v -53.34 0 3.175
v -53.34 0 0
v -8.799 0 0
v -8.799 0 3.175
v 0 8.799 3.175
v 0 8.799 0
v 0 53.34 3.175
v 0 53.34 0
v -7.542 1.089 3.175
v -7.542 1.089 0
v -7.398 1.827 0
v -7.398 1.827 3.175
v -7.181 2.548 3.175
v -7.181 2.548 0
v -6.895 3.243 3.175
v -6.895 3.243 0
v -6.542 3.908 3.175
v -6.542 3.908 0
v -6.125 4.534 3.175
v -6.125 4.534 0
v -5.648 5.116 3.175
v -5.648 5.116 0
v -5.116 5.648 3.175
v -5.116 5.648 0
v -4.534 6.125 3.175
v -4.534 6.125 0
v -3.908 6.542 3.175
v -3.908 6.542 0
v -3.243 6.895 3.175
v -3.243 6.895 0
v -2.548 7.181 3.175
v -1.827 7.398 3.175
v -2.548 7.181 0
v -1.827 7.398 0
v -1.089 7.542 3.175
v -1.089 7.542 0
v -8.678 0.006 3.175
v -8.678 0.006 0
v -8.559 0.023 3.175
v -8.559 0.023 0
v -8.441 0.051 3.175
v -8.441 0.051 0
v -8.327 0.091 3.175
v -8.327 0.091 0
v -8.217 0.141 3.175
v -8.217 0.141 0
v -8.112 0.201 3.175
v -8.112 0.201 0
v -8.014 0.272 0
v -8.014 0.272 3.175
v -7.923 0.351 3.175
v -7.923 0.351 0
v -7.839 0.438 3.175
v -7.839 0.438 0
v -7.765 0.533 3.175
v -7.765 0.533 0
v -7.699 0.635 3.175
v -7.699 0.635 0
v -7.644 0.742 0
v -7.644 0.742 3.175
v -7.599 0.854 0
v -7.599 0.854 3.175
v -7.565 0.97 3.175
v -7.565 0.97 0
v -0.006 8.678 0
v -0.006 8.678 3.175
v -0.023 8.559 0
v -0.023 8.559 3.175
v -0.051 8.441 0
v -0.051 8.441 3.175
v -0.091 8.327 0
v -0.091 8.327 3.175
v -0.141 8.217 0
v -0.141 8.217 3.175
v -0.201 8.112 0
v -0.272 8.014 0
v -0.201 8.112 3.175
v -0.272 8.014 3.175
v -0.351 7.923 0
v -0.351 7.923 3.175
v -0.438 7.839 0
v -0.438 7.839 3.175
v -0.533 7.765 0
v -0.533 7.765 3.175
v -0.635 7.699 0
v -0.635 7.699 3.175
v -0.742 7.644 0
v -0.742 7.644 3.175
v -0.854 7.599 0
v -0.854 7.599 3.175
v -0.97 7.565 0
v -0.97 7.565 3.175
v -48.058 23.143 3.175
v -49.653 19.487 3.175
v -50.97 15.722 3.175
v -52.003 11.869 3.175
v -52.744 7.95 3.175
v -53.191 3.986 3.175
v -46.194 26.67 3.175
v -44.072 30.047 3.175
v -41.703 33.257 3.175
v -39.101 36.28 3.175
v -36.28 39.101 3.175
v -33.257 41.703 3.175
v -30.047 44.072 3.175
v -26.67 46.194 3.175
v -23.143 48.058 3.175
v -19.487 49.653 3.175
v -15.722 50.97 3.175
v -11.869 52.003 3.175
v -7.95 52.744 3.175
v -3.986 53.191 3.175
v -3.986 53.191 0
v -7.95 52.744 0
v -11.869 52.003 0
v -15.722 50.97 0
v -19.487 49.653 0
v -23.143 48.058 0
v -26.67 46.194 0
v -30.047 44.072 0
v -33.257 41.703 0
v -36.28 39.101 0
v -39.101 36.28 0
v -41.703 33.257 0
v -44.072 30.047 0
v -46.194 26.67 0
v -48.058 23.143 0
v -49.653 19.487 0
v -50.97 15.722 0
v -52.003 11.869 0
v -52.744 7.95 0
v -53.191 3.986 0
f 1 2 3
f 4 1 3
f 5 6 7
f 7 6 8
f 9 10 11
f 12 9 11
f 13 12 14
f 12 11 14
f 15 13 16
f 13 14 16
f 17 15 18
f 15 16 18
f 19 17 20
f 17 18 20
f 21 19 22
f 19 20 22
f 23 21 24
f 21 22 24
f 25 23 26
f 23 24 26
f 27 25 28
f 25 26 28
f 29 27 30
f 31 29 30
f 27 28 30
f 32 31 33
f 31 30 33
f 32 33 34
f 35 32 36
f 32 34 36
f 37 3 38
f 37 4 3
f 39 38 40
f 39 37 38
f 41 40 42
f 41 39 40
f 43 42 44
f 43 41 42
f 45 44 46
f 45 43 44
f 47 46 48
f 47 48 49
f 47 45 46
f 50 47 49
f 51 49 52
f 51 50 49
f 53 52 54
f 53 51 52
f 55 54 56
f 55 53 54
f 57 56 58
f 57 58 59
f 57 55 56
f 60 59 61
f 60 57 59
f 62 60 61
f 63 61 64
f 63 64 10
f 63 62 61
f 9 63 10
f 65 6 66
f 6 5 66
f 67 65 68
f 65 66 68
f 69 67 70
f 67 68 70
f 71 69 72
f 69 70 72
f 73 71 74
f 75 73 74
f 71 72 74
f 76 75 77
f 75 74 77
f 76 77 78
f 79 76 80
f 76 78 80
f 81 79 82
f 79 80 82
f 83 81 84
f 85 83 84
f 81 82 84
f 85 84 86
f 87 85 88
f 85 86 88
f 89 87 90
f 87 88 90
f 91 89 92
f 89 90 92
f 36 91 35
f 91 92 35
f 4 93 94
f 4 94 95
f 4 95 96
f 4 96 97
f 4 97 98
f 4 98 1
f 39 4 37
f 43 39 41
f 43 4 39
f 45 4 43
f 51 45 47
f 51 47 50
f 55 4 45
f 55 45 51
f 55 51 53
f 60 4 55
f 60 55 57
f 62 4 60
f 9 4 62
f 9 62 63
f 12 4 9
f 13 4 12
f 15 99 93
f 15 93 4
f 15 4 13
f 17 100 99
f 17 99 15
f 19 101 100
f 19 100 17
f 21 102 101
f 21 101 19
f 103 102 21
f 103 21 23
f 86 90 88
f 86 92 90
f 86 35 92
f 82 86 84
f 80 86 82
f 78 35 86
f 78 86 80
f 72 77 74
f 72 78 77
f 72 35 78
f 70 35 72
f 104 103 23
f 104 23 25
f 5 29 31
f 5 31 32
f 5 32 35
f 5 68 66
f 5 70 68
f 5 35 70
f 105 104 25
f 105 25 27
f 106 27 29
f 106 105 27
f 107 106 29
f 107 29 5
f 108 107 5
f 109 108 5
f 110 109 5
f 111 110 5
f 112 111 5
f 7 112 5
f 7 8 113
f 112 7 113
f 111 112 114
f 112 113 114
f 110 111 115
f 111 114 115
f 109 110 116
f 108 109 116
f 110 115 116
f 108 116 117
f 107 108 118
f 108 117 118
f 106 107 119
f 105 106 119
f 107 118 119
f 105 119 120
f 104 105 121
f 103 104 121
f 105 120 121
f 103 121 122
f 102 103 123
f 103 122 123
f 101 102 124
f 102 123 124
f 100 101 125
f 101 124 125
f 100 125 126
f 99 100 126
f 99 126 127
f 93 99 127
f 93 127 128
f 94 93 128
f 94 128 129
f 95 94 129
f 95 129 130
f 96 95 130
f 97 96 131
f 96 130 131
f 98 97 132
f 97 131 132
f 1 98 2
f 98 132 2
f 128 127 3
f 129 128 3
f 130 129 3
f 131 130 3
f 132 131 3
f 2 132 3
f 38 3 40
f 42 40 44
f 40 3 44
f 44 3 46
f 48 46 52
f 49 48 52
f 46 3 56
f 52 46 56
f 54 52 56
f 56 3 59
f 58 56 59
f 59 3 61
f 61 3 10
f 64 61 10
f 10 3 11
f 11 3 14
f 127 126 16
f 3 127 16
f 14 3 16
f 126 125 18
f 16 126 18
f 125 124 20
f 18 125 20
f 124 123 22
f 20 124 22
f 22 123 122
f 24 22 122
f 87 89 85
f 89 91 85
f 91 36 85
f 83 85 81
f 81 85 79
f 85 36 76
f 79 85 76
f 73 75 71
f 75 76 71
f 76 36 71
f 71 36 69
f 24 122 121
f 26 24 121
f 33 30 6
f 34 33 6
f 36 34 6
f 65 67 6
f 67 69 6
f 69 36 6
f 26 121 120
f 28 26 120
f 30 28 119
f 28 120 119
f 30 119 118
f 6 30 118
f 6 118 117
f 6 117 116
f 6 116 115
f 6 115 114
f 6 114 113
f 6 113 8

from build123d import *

# Parameters (mm, degrees)
F1_DEPTH = 3.175
F2_R     = 1.27


# Not quite as in the source:
# - a feature names something its author has since deleted; it is built from what else it names


with BuildPart() as f1:
    # F0 (on Top) → F1 (new body)
    with BuildSketch(Plane.XY):
        with BuildLine():
            Line((0, 7.62), (0, 12.7))
            ThreePointArc((0, 12.7), (-8.9802561211, 8.9802561211), (-12.7, 0))
            Line((-12.7, 0), (-7.62, 0))
            ThreePointArc((-7.62, 0), (-5.3881536726, 5.3881536726), (0, 7.62))
        make_face()
        with BuildLine():
            ThreePointArc((-12.7, 0), (-8.9802561211, 8.9802561211), (0, 12.7))
            Line((0, 12.7), (0, 48.26))
            ThreePointArc((0, 48.26), (-34.1249732601, 34.1249732601), (-48.26, 0))
            Line((-48.26, 0), (-12.7, 0))
        make_face()
        with BuildLine():
            ThreePointArc((-48.26, 0), (-34.1249732601, 34.1249732601), (0, 48.26))
            Line((0, 48.26), (0, 53.34))
            ThreePointArc((0, 53.34), (-37.7170757085, 37.7170757085), (-53.34, 0))
            Line((-53.34, 0), (-48.26, 0))
        make_face()
    extrude(amount=F1_DEPTH)

    # F2
    f2_edges = [f1.edges().sort_by_distance(p)[0] for p in [
        (-7.62, 0, 1.5875),
        (0, 7.62, 1.5875),
    ]]
    fillet(f2_edges, radius=F2_R)


solid = f1.part
